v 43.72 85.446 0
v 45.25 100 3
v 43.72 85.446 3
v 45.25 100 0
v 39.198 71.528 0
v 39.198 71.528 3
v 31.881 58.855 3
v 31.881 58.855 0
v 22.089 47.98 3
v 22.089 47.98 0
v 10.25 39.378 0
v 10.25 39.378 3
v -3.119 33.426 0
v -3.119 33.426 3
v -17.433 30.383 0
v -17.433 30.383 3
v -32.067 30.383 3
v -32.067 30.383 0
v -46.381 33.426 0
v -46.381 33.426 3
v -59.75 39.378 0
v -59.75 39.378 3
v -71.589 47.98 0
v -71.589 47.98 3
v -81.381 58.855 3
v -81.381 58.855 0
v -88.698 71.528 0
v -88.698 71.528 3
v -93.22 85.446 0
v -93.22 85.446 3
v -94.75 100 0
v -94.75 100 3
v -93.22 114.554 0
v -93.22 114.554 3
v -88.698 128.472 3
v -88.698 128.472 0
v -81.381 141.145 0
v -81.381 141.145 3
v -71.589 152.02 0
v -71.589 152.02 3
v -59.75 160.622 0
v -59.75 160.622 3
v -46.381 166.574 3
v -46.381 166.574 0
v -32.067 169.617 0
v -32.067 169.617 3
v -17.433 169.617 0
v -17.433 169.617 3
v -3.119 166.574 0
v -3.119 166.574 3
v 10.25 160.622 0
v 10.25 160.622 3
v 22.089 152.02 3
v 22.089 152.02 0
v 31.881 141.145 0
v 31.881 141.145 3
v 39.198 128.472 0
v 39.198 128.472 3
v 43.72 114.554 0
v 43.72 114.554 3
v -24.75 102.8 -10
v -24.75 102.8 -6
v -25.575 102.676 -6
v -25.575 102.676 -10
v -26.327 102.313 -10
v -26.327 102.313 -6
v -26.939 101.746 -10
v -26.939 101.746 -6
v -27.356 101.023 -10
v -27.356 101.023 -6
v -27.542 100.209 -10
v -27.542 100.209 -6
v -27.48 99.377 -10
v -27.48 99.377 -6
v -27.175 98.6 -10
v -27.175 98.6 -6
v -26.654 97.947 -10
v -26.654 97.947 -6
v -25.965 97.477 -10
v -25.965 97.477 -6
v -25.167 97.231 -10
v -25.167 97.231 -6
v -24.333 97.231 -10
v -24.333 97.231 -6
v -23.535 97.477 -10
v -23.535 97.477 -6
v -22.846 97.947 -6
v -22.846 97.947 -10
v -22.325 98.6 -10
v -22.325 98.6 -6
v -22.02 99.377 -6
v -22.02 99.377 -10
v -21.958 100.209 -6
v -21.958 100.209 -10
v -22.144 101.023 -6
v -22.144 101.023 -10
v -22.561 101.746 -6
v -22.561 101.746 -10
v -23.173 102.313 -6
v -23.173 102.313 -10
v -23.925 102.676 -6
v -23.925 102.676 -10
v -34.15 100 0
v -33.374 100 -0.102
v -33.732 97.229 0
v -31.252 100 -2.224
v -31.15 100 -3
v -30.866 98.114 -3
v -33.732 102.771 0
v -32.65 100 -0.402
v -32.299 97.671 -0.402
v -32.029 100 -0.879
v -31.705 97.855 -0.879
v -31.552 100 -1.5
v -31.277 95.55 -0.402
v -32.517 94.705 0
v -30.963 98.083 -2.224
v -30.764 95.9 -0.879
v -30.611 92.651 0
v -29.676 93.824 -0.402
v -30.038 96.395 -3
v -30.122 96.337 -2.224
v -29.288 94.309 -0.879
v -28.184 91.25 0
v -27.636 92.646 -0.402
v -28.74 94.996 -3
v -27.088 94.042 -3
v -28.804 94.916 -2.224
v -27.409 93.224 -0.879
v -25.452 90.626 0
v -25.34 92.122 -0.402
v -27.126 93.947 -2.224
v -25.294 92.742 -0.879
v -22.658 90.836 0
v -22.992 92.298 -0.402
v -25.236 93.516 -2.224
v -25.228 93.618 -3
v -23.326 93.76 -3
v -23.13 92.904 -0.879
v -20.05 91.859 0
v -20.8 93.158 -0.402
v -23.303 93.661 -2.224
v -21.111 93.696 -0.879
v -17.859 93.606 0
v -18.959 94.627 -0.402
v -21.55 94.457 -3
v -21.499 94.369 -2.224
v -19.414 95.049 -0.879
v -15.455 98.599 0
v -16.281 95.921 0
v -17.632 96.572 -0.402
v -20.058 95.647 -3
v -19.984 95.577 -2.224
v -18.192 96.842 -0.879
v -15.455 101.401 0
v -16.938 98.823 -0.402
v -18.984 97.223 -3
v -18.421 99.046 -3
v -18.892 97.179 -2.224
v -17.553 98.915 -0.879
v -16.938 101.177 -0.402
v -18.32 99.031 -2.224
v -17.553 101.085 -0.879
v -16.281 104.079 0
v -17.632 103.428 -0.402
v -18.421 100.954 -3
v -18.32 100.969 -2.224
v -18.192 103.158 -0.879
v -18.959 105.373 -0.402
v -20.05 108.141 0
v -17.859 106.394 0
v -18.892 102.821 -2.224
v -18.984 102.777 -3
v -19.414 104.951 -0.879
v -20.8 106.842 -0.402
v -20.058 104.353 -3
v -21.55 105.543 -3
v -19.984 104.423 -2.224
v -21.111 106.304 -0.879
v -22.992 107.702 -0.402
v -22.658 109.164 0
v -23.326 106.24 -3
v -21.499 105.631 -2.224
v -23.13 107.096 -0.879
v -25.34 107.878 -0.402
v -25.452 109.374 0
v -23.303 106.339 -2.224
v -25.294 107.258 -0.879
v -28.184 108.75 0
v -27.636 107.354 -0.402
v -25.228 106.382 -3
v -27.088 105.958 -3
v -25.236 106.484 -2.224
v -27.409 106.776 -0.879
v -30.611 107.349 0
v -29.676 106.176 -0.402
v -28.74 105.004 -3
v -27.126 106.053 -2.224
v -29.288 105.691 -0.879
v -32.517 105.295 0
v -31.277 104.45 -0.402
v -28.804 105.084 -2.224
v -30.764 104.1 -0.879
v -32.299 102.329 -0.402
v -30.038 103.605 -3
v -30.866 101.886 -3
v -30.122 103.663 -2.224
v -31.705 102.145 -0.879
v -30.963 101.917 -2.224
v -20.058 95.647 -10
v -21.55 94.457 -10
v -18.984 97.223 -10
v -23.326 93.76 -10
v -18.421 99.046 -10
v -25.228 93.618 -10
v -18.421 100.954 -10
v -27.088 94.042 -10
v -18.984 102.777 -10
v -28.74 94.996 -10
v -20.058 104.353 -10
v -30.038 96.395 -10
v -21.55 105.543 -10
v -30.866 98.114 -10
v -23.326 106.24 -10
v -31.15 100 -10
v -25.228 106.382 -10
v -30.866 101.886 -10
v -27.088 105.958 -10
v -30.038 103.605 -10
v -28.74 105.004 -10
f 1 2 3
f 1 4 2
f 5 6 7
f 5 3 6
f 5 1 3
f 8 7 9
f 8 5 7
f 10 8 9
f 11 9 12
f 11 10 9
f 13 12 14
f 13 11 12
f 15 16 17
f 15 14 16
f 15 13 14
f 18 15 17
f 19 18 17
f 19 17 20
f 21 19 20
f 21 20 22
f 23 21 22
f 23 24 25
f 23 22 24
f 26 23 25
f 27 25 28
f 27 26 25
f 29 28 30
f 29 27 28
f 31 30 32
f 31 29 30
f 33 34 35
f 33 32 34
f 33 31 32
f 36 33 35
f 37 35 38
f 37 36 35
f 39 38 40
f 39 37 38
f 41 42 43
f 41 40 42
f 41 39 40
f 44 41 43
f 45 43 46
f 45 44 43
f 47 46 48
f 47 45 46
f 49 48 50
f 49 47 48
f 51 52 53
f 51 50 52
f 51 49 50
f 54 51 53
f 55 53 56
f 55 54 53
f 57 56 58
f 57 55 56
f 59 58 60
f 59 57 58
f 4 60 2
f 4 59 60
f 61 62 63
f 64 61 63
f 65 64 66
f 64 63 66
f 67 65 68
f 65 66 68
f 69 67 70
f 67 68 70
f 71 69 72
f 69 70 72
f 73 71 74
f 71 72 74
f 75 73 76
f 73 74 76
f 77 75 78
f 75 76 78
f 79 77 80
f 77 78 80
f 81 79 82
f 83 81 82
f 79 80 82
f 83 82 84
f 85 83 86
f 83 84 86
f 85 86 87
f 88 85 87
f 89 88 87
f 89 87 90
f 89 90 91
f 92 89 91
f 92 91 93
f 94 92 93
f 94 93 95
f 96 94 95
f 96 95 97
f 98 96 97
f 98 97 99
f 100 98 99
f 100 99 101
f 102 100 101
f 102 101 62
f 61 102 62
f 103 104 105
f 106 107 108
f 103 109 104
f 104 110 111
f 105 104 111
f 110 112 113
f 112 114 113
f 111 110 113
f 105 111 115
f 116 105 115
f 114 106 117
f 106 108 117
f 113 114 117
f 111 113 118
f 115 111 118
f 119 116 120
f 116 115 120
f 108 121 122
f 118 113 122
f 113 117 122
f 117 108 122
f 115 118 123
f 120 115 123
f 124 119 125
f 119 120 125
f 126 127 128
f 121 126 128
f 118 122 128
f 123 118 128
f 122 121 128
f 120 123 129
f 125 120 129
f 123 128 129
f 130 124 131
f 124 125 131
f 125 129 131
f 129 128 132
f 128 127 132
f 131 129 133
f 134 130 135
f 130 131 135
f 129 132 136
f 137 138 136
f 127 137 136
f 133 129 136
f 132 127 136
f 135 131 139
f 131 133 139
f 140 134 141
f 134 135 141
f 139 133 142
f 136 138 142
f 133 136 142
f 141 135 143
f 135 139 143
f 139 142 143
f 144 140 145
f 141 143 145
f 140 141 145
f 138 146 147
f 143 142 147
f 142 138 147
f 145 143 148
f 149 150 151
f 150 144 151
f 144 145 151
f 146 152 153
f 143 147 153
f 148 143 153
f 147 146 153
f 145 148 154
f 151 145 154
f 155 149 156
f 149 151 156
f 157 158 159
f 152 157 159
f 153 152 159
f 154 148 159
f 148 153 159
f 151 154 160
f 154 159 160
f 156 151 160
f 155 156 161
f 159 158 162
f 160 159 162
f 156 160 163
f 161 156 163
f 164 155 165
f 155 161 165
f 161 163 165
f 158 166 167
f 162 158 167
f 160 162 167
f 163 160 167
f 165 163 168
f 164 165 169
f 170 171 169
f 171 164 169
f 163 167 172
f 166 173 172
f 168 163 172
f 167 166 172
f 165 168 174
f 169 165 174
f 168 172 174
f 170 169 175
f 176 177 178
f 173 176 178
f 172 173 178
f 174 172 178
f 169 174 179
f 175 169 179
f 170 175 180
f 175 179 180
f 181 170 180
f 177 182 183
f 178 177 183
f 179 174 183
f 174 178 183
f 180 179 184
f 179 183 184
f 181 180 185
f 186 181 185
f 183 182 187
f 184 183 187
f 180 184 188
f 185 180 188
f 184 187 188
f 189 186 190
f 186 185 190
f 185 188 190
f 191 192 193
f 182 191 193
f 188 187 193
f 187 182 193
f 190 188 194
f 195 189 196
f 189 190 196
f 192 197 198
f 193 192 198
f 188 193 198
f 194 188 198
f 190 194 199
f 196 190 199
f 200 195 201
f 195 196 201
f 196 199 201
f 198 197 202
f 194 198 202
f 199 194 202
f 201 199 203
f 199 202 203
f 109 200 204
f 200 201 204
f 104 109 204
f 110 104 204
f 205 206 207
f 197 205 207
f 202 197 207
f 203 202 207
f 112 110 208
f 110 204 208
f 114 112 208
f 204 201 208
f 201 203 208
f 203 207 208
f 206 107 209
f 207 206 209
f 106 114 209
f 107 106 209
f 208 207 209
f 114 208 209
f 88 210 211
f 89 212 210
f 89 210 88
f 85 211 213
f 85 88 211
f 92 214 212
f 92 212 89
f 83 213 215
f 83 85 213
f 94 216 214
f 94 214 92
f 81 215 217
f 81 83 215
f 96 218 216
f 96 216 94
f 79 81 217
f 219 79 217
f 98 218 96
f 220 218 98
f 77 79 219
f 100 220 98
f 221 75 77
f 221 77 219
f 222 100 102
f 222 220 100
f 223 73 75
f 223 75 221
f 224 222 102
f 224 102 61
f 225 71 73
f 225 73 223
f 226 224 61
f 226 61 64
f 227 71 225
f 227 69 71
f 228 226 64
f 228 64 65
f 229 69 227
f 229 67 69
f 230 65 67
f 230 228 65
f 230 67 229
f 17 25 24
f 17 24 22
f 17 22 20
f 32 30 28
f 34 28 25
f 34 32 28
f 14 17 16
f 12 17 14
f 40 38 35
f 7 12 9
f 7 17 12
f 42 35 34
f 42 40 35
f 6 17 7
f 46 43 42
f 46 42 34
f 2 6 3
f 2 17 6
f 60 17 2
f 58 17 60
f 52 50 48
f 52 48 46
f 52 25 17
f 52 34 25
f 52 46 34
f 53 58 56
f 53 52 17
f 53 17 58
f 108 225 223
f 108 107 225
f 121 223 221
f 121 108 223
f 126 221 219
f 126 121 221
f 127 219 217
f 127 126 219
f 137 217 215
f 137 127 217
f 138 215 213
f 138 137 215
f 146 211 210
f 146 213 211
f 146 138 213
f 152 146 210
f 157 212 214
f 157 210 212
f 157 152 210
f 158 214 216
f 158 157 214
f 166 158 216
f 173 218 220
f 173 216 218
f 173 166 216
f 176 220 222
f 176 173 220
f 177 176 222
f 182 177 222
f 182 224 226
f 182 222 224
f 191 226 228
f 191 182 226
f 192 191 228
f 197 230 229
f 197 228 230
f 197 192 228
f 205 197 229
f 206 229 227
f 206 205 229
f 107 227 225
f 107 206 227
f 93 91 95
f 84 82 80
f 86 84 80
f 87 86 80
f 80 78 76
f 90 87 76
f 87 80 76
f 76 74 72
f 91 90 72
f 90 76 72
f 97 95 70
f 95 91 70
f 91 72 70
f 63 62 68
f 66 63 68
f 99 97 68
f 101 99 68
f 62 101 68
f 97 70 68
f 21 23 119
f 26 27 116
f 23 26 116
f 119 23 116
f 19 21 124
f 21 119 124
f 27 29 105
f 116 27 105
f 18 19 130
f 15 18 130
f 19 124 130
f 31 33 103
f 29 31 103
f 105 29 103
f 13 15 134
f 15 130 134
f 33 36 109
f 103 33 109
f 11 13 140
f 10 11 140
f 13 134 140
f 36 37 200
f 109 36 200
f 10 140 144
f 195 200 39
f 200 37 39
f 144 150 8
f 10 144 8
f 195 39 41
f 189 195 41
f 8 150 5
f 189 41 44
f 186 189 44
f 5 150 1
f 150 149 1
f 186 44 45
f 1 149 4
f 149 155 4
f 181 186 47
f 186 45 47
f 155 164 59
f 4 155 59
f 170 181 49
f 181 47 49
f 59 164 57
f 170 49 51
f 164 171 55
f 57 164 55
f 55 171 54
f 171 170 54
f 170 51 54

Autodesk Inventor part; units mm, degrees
ref_plane "YZ Plane" through (0, 0, 0) normal (1, 0, 0) x (0, 1, 0)
ref_plane "XZ Plane" through (0, 0, 0) normal (0, 1, 0) x (-1, 0, 0)
ref_plane "XY Plane" through (0, 0, 0) normal (0, 0, 1) x (1, 0, 0)
sketch "Boceto1" plane through (0, 0, 0) normal (0, 0, 1) x (1, 0, 0)
  circle A0 centre (-24.75, 100) radius 51.4081 projected
  circle A1 centre (-24.75, 100) radius 70
  point P0 (0, 0)
  dimension "d0" = 140
extrude "Extrusión1" add sketch "Boceto1" along normal blind 3 contours A0 | A1
sketch "Boceto2" plane through (-24.75, 100, 0) normal (0, 0, -1) x (-1, 0, 0)
  circle A0 centre (0, 0) radius 6.4
  point P0 (-24.75, -100)
  dimension "d3" = 12.8
extrude "Extrusión2" add sketch "Boceto2" along normal blind 10
sketch "Boceto3" plane through (-24.75, 100, -10) normal (0, 0, -1) x (-1, 0, 0)
  circle A0 centre (0, 0) radius 6.4 projected
  point P0 (-24.75, -100)
hole "Agujero1" at (-24.75, 100, -10) direction (0, 0, 1) diameter 5.6 depth 4
fillet "Empalme1" radius 3 1 edges at (-18.35, 100, 0)
properties part number "Base_Plato"
